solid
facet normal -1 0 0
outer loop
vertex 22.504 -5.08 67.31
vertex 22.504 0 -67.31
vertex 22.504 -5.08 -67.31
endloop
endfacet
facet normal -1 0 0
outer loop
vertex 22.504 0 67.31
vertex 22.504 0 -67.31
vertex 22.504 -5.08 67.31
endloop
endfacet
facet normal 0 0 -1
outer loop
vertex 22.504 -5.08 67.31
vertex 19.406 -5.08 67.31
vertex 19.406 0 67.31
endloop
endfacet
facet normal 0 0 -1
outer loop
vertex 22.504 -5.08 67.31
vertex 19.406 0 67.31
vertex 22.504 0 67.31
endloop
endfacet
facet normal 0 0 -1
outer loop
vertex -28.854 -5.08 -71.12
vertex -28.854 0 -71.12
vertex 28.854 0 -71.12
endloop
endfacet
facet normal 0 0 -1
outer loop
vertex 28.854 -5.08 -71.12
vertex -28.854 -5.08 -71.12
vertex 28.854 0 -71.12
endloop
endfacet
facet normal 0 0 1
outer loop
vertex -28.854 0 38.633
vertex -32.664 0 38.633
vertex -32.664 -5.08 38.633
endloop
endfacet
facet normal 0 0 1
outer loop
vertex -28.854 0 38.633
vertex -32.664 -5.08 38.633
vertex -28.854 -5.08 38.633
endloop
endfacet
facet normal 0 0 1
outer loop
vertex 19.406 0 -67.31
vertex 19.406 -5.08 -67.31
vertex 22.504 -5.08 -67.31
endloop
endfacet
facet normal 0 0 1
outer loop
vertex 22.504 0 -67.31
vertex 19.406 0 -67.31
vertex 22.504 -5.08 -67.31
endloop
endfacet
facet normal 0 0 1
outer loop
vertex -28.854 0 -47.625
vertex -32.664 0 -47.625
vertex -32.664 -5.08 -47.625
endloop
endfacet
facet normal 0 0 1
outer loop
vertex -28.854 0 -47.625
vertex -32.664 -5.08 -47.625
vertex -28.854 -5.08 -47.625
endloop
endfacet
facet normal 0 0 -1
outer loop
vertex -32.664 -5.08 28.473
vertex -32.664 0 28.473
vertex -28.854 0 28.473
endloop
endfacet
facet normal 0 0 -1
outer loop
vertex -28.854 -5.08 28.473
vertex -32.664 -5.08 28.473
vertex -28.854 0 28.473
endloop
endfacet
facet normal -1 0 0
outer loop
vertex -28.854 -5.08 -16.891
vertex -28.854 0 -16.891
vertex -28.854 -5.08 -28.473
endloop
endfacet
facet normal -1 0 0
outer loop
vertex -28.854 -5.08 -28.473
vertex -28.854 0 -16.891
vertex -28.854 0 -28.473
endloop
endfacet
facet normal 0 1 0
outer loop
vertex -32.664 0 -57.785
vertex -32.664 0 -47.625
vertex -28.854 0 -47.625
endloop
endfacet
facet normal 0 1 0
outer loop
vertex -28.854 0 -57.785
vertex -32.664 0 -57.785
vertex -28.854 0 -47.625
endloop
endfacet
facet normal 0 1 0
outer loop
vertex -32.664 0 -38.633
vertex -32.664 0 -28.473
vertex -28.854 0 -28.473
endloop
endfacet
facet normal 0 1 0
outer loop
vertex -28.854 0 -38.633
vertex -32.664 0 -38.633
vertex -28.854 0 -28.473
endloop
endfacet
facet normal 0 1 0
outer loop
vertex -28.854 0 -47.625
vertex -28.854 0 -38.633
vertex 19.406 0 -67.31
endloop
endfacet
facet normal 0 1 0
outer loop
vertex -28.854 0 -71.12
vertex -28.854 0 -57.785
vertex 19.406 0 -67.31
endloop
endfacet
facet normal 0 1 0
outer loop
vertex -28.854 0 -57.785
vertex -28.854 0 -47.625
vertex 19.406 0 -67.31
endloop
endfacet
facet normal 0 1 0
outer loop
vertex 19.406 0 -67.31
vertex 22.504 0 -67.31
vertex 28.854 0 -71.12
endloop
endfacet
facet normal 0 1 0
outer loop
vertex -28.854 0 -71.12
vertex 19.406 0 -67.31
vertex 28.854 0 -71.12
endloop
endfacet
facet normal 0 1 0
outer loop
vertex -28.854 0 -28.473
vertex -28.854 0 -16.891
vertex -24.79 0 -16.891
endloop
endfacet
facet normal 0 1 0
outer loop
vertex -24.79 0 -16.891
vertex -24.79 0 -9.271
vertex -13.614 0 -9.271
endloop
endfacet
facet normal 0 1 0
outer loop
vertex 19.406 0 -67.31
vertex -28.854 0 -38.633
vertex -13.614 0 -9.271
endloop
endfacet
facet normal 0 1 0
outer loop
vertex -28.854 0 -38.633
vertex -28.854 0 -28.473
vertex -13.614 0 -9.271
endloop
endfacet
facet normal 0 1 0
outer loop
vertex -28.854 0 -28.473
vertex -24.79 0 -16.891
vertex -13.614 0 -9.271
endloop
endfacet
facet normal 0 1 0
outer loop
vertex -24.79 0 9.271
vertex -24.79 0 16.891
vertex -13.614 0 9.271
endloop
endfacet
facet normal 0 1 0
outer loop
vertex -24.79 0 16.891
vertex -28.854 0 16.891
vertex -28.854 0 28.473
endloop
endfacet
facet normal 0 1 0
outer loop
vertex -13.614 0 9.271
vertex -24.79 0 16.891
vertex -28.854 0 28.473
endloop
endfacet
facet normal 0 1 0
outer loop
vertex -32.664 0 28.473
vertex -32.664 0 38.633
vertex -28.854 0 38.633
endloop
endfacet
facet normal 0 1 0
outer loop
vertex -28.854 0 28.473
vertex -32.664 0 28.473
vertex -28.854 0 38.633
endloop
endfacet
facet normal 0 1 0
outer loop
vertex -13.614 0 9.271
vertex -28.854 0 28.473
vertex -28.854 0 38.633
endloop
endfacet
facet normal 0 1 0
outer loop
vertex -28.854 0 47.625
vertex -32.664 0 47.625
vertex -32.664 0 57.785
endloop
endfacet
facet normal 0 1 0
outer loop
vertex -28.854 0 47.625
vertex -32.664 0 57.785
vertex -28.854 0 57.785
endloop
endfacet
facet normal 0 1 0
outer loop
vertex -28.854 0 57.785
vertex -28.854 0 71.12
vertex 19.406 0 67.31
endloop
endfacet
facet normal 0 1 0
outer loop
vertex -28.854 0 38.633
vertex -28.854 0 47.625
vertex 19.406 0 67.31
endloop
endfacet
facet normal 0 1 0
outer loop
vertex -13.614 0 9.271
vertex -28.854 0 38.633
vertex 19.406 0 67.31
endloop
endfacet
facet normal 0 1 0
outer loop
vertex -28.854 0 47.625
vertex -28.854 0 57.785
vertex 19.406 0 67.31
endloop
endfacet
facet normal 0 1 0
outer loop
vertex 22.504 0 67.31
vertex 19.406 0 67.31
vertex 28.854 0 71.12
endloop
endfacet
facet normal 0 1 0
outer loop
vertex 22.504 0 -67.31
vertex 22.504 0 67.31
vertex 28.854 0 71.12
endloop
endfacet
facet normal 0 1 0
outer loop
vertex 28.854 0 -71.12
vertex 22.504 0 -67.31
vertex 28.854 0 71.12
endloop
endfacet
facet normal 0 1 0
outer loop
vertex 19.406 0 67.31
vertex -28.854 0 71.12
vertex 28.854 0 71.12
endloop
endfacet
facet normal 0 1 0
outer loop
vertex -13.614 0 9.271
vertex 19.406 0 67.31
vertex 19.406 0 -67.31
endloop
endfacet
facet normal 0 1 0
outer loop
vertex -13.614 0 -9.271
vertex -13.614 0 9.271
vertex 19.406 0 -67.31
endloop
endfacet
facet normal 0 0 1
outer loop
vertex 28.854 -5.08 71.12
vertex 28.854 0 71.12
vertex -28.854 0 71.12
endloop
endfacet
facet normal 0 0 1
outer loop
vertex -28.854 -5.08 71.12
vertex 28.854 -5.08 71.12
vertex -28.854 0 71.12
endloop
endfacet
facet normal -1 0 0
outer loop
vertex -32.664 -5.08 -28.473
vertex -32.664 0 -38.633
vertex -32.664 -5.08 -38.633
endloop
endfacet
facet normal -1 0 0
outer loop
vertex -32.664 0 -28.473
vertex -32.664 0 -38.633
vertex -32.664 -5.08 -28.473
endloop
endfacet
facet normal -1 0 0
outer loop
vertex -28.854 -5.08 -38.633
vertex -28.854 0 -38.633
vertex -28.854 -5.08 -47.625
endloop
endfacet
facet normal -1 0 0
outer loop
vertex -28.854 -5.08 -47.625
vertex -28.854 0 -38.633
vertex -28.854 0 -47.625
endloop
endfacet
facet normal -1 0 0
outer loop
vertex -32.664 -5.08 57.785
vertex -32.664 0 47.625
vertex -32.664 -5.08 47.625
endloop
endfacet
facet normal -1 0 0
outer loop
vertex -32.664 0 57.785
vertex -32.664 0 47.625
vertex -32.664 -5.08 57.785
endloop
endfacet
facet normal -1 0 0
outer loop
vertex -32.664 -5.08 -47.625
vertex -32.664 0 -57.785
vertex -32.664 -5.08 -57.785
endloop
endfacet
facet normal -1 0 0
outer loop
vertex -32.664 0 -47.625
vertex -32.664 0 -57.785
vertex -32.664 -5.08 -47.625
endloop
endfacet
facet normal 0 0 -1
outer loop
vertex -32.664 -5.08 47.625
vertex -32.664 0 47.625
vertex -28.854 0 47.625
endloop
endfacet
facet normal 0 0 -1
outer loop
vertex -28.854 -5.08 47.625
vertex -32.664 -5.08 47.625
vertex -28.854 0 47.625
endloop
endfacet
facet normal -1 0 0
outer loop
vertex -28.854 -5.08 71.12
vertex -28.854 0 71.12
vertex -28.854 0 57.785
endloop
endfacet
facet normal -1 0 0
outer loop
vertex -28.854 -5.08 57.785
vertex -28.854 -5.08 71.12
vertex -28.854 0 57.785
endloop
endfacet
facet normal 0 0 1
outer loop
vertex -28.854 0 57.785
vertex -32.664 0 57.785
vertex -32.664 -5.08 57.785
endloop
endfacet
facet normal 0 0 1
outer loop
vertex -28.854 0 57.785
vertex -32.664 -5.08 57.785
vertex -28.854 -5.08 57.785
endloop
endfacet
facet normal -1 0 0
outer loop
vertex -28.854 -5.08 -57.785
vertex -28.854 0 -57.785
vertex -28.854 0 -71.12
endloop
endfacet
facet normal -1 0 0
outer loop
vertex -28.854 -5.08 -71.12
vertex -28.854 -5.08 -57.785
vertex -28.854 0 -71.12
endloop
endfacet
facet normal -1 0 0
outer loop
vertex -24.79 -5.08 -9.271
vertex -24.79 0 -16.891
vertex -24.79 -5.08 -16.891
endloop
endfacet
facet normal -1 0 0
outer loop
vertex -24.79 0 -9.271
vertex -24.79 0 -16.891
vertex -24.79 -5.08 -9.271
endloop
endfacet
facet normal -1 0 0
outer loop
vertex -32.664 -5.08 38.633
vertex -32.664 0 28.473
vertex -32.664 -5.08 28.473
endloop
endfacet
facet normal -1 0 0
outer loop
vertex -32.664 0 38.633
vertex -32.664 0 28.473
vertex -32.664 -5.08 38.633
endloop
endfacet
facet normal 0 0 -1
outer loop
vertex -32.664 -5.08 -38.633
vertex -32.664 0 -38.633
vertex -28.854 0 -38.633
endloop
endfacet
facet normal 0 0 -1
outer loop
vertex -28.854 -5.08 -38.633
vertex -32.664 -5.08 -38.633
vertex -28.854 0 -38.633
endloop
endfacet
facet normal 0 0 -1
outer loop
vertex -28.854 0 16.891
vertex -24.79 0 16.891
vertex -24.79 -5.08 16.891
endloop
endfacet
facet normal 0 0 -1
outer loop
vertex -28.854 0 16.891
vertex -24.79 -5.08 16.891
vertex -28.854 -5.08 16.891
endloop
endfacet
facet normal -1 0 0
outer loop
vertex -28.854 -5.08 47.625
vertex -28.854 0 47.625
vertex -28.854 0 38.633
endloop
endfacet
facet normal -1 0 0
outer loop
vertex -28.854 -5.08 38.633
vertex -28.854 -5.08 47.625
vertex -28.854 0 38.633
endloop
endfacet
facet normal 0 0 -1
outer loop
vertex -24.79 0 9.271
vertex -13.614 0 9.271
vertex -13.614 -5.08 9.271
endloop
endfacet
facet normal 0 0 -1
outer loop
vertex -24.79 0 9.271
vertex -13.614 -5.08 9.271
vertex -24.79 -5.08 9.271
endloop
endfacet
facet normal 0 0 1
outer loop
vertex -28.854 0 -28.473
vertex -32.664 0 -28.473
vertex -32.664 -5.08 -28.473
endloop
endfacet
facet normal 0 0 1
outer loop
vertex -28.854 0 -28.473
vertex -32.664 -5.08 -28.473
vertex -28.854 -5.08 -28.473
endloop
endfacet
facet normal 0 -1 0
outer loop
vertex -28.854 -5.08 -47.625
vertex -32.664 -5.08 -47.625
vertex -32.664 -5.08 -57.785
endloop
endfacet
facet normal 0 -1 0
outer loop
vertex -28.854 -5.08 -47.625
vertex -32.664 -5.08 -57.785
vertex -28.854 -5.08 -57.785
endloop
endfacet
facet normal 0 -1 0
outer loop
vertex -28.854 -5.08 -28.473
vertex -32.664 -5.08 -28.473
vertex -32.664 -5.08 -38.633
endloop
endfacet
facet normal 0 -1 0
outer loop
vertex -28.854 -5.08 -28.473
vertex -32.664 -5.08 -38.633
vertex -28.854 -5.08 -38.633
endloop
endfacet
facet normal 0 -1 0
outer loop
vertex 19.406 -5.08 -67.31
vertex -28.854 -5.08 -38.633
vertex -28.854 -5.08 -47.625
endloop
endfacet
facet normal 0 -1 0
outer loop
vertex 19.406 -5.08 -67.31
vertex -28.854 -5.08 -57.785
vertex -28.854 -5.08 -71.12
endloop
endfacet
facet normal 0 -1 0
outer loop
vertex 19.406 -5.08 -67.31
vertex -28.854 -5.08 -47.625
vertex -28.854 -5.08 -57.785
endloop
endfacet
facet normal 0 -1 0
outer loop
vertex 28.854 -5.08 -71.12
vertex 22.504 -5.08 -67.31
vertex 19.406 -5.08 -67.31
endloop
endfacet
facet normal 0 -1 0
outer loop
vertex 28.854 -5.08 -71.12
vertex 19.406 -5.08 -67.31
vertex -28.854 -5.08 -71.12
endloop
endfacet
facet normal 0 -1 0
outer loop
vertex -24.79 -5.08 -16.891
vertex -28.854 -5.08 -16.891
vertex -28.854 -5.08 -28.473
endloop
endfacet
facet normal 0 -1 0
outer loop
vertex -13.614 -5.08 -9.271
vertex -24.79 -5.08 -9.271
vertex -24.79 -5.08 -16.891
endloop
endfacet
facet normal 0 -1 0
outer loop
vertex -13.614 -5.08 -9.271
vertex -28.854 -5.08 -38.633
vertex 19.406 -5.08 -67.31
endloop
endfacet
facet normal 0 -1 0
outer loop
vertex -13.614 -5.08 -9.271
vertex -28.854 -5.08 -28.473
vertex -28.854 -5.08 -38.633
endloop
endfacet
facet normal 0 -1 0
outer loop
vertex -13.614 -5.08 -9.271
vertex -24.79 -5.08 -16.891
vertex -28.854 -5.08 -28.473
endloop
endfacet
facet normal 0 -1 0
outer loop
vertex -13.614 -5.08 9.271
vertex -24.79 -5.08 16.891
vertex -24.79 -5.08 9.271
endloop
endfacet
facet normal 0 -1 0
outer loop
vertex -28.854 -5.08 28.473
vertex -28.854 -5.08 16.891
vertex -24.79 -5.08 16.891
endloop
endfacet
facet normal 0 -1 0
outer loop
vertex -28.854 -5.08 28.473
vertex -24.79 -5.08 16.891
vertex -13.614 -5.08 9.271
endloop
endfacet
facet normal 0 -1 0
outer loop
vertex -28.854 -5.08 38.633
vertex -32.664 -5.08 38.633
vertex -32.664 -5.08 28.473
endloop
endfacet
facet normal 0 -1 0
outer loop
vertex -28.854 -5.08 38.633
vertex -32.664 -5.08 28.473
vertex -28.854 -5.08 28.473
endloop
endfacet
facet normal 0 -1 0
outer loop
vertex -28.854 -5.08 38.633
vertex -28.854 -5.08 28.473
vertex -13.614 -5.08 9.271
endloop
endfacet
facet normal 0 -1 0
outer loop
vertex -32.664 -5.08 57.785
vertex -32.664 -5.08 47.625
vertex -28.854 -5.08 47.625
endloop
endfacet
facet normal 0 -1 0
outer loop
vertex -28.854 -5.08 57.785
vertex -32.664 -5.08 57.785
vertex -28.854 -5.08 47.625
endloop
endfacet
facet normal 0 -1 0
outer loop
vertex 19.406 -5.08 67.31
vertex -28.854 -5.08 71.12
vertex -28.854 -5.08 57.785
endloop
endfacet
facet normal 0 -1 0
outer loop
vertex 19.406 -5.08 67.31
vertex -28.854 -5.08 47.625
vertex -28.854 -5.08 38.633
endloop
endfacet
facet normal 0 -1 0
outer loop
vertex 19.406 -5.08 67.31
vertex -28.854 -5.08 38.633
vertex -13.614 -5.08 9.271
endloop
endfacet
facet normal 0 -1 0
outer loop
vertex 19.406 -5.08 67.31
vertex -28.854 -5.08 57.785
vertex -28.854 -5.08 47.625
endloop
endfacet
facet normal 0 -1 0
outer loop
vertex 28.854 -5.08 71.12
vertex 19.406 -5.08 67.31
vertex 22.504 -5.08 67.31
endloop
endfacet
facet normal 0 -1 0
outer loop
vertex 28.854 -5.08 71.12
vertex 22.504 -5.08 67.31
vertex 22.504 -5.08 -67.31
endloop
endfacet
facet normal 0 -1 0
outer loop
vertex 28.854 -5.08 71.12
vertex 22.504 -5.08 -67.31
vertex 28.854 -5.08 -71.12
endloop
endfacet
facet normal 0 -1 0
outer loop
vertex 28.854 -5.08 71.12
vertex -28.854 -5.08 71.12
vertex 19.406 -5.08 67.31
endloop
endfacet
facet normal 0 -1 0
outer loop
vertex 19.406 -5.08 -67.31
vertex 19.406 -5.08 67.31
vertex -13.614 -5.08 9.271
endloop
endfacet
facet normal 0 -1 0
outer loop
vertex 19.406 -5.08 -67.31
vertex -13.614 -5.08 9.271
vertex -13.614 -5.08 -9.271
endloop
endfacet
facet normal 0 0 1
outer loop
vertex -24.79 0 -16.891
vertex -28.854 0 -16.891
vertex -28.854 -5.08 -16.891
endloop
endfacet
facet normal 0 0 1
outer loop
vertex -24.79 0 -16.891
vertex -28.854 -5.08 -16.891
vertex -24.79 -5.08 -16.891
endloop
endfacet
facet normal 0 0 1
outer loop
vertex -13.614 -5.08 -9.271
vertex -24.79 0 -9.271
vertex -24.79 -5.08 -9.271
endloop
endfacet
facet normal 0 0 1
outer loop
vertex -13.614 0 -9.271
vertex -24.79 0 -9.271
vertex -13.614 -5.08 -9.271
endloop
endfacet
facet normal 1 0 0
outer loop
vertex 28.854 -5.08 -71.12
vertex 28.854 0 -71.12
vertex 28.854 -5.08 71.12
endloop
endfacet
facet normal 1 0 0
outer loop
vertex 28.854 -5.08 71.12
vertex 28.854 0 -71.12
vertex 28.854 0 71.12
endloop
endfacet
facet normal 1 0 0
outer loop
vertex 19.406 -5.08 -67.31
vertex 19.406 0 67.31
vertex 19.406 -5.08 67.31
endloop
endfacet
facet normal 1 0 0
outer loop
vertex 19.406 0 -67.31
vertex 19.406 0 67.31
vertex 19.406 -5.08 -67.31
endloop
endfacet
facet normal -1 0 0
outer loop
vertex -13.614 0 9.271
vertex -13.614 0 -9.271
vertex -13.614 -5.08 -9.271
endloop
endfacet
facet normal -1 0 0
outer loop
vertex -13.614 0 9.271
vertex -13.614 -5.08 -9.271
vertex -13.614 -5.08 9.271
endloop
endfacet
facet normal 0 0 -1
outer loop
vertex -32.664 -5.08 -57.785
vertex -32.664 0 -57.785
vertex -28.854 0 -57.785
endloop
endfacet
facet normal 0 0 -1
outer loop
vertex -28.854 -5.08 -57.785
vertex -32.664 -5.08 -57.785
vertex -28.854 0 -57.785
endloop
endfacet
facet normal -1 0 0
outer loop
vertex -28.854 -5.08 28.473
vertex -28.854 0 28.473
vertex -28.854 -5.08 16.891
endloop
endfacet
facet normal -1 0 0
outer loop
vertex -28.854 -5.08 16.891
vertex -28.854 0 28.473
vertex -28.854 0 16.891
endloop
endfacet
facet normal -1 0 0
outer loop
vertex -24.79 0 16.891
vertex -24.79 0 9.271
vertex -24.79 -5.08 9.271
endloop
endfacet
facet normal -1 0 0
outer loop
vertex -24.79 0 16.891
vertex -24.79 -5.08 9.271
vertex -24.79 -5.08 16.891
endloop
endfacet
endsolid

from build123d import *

# Parameters (mm, degrees)
F0_W     = 3.81
F0_H     = 10.16
F2_DEPTH = 5.08
F1_W     = 3.0988
F1_H     = 67.31
F1_W_2   = 4.064
F1_H_2   = 7.62
F1_W_3   = 2.032
F1_H_3   = 9.271
F3_DEPTH = 33.274


with BuildPart() as f2:
    # F0 (on Front) → F2 (new body)
    with BuildSketch(Plane.XZ):
        Polygon((28.8544, 71.12), (-28.8544, 71.12), (-28.8544, 57.785), (-28.8544, 47.625), (-28.8544, 38.6334), (-28.8544, 28.4734), (-28.8544, 0), (-28.8544, -28.4734), (-28.8544, -38.6334), (-28.8544, -47.625), (-28.8544, -57.785), (-28.8544, -71.12), (28.8544, -71.12), align=None)
        with Locations((-30.7594, 52.705)):
            Rectangle(F0_W, F0_H)
        with Locations((-30.7594, 33.5534)):
            Rectangle(F0_W, F0_H)
        with Locations((-30.7594, -52.705)):
            Rectangle(F0_W, F0_H)
        with Locations((-30.7594, -33.5534)):
            Rectangle(F0_W, F0_H)
    extrude(amount=F2_DEPTH)

    # F1 (on Front) → F3 (cut)
    with BuildSketch(Plane.XZ):
        with Locations((20.955, 33.655)):
            Rectangle(F1_W, F1_H)
        with Locations((20.955, -33.655)):
            Rectangle(F1_W, F1_H)
        Polygon((-13.6144, -9.271), (-13.6144, 0), (-13.6144, 9.271), (-24.7904, 9.271), (-26.8224, 9.271), (-26.8224, 0), (-28.8544, 0), (-28.8544, -9.271), (-24.7904, -9.271), align=None)
        Polygon((-26.8224, 9.271), (-24.7904, 9.271), (-24.7904, 16.891), (-28.8544, 16.891), (-28.8544, 9.271), align=None)
        with Locations((-26.8224, -13.081)):
            Rectangle(F1_W_2, F1_H_2)
        with Locations((-27.8384, 4.6355)):
            Rectangle(F1_W_3, F1_H_3)
    extrude(amount=F3_DEPTH, mode=Mode.SUBTRACT)


solid = f2.part
